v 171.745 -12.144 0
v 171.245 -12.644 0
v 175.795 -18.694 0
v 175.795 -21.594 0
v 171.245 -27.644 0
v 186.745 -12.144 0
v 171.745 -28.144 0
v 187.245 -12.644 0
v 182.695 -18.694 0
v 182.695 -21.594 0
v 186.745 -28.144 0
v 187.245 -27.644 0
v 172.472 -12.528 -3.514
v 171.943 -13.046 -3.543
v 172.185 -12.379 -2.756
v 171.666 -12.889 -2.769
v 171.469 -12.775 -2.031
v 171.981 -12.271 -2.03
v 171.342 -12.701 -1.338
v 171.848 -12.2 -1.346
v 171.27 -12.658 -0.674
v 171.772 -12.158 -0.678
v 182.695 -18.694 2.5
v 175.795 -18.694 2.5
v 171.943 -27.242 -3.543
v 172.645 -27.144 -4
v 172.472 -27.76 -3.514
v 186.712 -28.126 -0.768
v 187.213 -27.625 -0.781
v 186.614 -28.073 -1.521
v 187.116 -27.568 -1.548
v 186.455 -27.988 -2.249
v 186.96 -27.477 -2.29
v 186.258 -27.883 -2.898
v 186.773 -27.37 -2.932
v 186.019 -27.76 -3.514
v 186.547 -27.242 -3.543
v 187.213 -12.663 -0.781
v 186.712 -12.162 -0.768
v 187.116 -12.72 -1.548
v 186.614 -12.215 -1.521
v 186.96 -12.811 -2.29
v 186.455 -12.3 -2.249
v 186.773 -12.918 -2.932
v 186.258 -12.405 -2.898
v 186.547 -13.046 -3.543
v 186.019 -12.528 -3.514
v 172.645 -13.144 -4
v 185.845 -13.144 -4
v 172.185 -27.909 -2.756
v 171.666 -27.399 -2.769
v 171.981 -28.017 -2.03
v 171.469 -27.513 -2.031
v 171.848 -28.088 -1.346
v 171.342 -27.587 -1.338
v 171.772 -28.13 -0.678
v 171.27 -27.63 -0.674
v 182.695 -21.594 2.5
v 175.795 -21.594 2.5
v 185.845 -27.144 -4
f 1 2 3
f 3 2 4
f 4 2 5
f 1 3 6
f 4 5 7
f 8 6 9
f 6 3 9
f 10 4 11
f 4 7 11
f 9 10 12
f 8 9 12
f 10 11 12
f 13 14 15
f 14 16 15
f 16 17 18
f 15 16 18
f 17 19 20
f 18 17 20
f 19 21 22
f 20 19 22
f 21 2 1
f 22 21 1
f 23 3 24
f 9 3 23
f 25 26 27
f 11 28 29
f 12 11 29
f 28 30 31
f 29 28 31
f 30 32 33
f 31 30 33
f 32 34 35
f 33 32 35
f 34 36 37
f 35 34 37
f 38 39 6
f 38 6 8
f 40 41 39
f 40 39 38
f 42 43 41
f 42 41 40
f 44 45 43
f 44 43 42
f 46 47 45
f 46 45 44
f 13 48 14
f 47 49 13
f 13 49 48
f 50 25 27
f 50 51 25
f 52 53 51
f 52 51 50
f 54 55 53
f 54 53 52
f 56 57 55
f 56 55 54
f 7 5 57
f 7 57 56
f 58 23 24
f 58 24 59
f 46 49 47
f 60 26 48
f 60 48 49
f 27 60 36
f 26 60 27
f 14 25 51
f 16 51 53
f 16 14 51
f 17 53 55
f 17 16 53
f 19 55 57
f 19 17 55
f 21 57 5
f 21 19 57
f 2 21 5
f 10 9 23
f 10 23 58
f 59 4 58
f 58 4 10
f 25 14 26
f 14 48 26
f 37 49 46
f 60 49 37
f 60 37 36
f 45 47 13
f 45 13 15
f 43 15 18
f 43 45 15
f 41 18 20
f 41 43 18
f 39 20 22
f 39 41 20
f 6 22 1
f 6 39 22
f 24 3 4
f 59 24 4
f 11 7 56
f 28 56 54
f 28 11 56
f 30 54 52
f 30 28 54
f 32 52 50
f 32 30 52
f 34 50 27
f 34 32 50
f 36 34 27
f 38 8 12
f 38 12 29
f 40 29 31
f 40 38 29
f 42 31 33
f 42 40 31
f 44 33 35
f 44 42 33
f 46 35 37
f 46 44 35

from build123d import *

# Parameters (mm, degrees)
SKETCH012_W             = 16
SKETCH012_H             = 16
PAD001_DEPTH            = 4
POCKET011_DEPTH         = 16.001
POCKET012_DEPTH         = 16.001
SKETCH015_W             = 2.9
SKETCH015_H             = 6.9
PAD002_DEPTH            = 2.5
CHAMFER_SIZE            = 0.5
BODY002_PLACEMENT_ANGLE = 180


with BuildPart() as part:
    # Sketch012 (on XY_Plane002 of Origin004) → Pad001 (new body)
    with BuildSketch(Plane.XY):
        with Locations((130.823461, 8)):
            Rectangle(SKETCH012_W, SKETCH012_H)
    extrude(amount=PAD001_DEPTH)

    # Sketch013 (on Face1 of Pad001) → Pocket011 (cut, through all)
    with BuildSketch(Plane.XZ):
        with BuildLine():
            ThreePointArc((123.723461, 4), (123.051239, 2.05), (122.823461, 0))
            Line((122.823461, 4), (122.823461, 0))
            Line((123.723461, 4), (122.823461, 4))
        make_face()
        with BuildLine():
            ThreePointArc((138.823461, 0), (138.595683, 2.05), (137.923461, 4))
            Line((137.923461, 4), (138.823461, 4))
            Line((138.823461, 4), (138.823461, 0))
        make_face()
    extrude(amount=-POCKET011_DEPTH, mode=Mode.SUBTRACT)

    # Sketch014 (on Face2 of Pad001) → Pocket012 (cut, through all)
    with BuildSketch(Plane.YZ.offset(138.823461)):
        with BuildLine():
            ThreePointArc((0.5, 4), (0.125485, 2.015564), (0, 0))
            Line((0, 0), (0, 4))
            Line((0.5, 4), (0, 4))
        make_face()
        with BuildLine():
            ThreePointArc((16, 0), (15.874515, 2.015564), (15.5, 4))
            Line((15.5, 4), (16, 4))
            Line((16, 4), (16, 0))
        make_face()
    extrude(amount=-POCKET012_DEPTH, mode=Mode.SUBTRACT)

    # Sketch015 → Pad002 (join)
    with BuildSketch(Plane(origin=(127.960214, 8.35, 0), x_dir=(0, 1, 0), z_dir=(0, 0, -1))):
        with Locations((-0.35, 2.863247)):
            Rectangle(SKETCH015_W, SKETCH015_H)
    extrude(amount=PAD002_DEPTH)

    # Chamfer
    chamfer_edges = [part.edges().sort_by_distance(p)[0] for p in [
        (123.054343, 0.131581, 2.06375),
        (138.592578, 0.131581, 2.06375),
        (138.592578, 15.868419, 2.06375),
        (123.054343, 15.868419, 2.06375),
        (123.723461, 8, 4),
        (130.823461, 15.5, 4),
        (137.923461, 8, 4),
        (130.823461, 0.5, 4),
    ]]
    chamfer(chamfer_edges, length=CHAMFER_SIZE)


with BuildPart() as part_1:
    # Body002 placement: moved
    add(part.part.moved(Location((48.422, -12.144, 0))).rotate(Axis((48.422, -12.144, 0), (1, 0, 0)), BODY002_PLACEMENT_ANGLE))


solid = part_1.part
